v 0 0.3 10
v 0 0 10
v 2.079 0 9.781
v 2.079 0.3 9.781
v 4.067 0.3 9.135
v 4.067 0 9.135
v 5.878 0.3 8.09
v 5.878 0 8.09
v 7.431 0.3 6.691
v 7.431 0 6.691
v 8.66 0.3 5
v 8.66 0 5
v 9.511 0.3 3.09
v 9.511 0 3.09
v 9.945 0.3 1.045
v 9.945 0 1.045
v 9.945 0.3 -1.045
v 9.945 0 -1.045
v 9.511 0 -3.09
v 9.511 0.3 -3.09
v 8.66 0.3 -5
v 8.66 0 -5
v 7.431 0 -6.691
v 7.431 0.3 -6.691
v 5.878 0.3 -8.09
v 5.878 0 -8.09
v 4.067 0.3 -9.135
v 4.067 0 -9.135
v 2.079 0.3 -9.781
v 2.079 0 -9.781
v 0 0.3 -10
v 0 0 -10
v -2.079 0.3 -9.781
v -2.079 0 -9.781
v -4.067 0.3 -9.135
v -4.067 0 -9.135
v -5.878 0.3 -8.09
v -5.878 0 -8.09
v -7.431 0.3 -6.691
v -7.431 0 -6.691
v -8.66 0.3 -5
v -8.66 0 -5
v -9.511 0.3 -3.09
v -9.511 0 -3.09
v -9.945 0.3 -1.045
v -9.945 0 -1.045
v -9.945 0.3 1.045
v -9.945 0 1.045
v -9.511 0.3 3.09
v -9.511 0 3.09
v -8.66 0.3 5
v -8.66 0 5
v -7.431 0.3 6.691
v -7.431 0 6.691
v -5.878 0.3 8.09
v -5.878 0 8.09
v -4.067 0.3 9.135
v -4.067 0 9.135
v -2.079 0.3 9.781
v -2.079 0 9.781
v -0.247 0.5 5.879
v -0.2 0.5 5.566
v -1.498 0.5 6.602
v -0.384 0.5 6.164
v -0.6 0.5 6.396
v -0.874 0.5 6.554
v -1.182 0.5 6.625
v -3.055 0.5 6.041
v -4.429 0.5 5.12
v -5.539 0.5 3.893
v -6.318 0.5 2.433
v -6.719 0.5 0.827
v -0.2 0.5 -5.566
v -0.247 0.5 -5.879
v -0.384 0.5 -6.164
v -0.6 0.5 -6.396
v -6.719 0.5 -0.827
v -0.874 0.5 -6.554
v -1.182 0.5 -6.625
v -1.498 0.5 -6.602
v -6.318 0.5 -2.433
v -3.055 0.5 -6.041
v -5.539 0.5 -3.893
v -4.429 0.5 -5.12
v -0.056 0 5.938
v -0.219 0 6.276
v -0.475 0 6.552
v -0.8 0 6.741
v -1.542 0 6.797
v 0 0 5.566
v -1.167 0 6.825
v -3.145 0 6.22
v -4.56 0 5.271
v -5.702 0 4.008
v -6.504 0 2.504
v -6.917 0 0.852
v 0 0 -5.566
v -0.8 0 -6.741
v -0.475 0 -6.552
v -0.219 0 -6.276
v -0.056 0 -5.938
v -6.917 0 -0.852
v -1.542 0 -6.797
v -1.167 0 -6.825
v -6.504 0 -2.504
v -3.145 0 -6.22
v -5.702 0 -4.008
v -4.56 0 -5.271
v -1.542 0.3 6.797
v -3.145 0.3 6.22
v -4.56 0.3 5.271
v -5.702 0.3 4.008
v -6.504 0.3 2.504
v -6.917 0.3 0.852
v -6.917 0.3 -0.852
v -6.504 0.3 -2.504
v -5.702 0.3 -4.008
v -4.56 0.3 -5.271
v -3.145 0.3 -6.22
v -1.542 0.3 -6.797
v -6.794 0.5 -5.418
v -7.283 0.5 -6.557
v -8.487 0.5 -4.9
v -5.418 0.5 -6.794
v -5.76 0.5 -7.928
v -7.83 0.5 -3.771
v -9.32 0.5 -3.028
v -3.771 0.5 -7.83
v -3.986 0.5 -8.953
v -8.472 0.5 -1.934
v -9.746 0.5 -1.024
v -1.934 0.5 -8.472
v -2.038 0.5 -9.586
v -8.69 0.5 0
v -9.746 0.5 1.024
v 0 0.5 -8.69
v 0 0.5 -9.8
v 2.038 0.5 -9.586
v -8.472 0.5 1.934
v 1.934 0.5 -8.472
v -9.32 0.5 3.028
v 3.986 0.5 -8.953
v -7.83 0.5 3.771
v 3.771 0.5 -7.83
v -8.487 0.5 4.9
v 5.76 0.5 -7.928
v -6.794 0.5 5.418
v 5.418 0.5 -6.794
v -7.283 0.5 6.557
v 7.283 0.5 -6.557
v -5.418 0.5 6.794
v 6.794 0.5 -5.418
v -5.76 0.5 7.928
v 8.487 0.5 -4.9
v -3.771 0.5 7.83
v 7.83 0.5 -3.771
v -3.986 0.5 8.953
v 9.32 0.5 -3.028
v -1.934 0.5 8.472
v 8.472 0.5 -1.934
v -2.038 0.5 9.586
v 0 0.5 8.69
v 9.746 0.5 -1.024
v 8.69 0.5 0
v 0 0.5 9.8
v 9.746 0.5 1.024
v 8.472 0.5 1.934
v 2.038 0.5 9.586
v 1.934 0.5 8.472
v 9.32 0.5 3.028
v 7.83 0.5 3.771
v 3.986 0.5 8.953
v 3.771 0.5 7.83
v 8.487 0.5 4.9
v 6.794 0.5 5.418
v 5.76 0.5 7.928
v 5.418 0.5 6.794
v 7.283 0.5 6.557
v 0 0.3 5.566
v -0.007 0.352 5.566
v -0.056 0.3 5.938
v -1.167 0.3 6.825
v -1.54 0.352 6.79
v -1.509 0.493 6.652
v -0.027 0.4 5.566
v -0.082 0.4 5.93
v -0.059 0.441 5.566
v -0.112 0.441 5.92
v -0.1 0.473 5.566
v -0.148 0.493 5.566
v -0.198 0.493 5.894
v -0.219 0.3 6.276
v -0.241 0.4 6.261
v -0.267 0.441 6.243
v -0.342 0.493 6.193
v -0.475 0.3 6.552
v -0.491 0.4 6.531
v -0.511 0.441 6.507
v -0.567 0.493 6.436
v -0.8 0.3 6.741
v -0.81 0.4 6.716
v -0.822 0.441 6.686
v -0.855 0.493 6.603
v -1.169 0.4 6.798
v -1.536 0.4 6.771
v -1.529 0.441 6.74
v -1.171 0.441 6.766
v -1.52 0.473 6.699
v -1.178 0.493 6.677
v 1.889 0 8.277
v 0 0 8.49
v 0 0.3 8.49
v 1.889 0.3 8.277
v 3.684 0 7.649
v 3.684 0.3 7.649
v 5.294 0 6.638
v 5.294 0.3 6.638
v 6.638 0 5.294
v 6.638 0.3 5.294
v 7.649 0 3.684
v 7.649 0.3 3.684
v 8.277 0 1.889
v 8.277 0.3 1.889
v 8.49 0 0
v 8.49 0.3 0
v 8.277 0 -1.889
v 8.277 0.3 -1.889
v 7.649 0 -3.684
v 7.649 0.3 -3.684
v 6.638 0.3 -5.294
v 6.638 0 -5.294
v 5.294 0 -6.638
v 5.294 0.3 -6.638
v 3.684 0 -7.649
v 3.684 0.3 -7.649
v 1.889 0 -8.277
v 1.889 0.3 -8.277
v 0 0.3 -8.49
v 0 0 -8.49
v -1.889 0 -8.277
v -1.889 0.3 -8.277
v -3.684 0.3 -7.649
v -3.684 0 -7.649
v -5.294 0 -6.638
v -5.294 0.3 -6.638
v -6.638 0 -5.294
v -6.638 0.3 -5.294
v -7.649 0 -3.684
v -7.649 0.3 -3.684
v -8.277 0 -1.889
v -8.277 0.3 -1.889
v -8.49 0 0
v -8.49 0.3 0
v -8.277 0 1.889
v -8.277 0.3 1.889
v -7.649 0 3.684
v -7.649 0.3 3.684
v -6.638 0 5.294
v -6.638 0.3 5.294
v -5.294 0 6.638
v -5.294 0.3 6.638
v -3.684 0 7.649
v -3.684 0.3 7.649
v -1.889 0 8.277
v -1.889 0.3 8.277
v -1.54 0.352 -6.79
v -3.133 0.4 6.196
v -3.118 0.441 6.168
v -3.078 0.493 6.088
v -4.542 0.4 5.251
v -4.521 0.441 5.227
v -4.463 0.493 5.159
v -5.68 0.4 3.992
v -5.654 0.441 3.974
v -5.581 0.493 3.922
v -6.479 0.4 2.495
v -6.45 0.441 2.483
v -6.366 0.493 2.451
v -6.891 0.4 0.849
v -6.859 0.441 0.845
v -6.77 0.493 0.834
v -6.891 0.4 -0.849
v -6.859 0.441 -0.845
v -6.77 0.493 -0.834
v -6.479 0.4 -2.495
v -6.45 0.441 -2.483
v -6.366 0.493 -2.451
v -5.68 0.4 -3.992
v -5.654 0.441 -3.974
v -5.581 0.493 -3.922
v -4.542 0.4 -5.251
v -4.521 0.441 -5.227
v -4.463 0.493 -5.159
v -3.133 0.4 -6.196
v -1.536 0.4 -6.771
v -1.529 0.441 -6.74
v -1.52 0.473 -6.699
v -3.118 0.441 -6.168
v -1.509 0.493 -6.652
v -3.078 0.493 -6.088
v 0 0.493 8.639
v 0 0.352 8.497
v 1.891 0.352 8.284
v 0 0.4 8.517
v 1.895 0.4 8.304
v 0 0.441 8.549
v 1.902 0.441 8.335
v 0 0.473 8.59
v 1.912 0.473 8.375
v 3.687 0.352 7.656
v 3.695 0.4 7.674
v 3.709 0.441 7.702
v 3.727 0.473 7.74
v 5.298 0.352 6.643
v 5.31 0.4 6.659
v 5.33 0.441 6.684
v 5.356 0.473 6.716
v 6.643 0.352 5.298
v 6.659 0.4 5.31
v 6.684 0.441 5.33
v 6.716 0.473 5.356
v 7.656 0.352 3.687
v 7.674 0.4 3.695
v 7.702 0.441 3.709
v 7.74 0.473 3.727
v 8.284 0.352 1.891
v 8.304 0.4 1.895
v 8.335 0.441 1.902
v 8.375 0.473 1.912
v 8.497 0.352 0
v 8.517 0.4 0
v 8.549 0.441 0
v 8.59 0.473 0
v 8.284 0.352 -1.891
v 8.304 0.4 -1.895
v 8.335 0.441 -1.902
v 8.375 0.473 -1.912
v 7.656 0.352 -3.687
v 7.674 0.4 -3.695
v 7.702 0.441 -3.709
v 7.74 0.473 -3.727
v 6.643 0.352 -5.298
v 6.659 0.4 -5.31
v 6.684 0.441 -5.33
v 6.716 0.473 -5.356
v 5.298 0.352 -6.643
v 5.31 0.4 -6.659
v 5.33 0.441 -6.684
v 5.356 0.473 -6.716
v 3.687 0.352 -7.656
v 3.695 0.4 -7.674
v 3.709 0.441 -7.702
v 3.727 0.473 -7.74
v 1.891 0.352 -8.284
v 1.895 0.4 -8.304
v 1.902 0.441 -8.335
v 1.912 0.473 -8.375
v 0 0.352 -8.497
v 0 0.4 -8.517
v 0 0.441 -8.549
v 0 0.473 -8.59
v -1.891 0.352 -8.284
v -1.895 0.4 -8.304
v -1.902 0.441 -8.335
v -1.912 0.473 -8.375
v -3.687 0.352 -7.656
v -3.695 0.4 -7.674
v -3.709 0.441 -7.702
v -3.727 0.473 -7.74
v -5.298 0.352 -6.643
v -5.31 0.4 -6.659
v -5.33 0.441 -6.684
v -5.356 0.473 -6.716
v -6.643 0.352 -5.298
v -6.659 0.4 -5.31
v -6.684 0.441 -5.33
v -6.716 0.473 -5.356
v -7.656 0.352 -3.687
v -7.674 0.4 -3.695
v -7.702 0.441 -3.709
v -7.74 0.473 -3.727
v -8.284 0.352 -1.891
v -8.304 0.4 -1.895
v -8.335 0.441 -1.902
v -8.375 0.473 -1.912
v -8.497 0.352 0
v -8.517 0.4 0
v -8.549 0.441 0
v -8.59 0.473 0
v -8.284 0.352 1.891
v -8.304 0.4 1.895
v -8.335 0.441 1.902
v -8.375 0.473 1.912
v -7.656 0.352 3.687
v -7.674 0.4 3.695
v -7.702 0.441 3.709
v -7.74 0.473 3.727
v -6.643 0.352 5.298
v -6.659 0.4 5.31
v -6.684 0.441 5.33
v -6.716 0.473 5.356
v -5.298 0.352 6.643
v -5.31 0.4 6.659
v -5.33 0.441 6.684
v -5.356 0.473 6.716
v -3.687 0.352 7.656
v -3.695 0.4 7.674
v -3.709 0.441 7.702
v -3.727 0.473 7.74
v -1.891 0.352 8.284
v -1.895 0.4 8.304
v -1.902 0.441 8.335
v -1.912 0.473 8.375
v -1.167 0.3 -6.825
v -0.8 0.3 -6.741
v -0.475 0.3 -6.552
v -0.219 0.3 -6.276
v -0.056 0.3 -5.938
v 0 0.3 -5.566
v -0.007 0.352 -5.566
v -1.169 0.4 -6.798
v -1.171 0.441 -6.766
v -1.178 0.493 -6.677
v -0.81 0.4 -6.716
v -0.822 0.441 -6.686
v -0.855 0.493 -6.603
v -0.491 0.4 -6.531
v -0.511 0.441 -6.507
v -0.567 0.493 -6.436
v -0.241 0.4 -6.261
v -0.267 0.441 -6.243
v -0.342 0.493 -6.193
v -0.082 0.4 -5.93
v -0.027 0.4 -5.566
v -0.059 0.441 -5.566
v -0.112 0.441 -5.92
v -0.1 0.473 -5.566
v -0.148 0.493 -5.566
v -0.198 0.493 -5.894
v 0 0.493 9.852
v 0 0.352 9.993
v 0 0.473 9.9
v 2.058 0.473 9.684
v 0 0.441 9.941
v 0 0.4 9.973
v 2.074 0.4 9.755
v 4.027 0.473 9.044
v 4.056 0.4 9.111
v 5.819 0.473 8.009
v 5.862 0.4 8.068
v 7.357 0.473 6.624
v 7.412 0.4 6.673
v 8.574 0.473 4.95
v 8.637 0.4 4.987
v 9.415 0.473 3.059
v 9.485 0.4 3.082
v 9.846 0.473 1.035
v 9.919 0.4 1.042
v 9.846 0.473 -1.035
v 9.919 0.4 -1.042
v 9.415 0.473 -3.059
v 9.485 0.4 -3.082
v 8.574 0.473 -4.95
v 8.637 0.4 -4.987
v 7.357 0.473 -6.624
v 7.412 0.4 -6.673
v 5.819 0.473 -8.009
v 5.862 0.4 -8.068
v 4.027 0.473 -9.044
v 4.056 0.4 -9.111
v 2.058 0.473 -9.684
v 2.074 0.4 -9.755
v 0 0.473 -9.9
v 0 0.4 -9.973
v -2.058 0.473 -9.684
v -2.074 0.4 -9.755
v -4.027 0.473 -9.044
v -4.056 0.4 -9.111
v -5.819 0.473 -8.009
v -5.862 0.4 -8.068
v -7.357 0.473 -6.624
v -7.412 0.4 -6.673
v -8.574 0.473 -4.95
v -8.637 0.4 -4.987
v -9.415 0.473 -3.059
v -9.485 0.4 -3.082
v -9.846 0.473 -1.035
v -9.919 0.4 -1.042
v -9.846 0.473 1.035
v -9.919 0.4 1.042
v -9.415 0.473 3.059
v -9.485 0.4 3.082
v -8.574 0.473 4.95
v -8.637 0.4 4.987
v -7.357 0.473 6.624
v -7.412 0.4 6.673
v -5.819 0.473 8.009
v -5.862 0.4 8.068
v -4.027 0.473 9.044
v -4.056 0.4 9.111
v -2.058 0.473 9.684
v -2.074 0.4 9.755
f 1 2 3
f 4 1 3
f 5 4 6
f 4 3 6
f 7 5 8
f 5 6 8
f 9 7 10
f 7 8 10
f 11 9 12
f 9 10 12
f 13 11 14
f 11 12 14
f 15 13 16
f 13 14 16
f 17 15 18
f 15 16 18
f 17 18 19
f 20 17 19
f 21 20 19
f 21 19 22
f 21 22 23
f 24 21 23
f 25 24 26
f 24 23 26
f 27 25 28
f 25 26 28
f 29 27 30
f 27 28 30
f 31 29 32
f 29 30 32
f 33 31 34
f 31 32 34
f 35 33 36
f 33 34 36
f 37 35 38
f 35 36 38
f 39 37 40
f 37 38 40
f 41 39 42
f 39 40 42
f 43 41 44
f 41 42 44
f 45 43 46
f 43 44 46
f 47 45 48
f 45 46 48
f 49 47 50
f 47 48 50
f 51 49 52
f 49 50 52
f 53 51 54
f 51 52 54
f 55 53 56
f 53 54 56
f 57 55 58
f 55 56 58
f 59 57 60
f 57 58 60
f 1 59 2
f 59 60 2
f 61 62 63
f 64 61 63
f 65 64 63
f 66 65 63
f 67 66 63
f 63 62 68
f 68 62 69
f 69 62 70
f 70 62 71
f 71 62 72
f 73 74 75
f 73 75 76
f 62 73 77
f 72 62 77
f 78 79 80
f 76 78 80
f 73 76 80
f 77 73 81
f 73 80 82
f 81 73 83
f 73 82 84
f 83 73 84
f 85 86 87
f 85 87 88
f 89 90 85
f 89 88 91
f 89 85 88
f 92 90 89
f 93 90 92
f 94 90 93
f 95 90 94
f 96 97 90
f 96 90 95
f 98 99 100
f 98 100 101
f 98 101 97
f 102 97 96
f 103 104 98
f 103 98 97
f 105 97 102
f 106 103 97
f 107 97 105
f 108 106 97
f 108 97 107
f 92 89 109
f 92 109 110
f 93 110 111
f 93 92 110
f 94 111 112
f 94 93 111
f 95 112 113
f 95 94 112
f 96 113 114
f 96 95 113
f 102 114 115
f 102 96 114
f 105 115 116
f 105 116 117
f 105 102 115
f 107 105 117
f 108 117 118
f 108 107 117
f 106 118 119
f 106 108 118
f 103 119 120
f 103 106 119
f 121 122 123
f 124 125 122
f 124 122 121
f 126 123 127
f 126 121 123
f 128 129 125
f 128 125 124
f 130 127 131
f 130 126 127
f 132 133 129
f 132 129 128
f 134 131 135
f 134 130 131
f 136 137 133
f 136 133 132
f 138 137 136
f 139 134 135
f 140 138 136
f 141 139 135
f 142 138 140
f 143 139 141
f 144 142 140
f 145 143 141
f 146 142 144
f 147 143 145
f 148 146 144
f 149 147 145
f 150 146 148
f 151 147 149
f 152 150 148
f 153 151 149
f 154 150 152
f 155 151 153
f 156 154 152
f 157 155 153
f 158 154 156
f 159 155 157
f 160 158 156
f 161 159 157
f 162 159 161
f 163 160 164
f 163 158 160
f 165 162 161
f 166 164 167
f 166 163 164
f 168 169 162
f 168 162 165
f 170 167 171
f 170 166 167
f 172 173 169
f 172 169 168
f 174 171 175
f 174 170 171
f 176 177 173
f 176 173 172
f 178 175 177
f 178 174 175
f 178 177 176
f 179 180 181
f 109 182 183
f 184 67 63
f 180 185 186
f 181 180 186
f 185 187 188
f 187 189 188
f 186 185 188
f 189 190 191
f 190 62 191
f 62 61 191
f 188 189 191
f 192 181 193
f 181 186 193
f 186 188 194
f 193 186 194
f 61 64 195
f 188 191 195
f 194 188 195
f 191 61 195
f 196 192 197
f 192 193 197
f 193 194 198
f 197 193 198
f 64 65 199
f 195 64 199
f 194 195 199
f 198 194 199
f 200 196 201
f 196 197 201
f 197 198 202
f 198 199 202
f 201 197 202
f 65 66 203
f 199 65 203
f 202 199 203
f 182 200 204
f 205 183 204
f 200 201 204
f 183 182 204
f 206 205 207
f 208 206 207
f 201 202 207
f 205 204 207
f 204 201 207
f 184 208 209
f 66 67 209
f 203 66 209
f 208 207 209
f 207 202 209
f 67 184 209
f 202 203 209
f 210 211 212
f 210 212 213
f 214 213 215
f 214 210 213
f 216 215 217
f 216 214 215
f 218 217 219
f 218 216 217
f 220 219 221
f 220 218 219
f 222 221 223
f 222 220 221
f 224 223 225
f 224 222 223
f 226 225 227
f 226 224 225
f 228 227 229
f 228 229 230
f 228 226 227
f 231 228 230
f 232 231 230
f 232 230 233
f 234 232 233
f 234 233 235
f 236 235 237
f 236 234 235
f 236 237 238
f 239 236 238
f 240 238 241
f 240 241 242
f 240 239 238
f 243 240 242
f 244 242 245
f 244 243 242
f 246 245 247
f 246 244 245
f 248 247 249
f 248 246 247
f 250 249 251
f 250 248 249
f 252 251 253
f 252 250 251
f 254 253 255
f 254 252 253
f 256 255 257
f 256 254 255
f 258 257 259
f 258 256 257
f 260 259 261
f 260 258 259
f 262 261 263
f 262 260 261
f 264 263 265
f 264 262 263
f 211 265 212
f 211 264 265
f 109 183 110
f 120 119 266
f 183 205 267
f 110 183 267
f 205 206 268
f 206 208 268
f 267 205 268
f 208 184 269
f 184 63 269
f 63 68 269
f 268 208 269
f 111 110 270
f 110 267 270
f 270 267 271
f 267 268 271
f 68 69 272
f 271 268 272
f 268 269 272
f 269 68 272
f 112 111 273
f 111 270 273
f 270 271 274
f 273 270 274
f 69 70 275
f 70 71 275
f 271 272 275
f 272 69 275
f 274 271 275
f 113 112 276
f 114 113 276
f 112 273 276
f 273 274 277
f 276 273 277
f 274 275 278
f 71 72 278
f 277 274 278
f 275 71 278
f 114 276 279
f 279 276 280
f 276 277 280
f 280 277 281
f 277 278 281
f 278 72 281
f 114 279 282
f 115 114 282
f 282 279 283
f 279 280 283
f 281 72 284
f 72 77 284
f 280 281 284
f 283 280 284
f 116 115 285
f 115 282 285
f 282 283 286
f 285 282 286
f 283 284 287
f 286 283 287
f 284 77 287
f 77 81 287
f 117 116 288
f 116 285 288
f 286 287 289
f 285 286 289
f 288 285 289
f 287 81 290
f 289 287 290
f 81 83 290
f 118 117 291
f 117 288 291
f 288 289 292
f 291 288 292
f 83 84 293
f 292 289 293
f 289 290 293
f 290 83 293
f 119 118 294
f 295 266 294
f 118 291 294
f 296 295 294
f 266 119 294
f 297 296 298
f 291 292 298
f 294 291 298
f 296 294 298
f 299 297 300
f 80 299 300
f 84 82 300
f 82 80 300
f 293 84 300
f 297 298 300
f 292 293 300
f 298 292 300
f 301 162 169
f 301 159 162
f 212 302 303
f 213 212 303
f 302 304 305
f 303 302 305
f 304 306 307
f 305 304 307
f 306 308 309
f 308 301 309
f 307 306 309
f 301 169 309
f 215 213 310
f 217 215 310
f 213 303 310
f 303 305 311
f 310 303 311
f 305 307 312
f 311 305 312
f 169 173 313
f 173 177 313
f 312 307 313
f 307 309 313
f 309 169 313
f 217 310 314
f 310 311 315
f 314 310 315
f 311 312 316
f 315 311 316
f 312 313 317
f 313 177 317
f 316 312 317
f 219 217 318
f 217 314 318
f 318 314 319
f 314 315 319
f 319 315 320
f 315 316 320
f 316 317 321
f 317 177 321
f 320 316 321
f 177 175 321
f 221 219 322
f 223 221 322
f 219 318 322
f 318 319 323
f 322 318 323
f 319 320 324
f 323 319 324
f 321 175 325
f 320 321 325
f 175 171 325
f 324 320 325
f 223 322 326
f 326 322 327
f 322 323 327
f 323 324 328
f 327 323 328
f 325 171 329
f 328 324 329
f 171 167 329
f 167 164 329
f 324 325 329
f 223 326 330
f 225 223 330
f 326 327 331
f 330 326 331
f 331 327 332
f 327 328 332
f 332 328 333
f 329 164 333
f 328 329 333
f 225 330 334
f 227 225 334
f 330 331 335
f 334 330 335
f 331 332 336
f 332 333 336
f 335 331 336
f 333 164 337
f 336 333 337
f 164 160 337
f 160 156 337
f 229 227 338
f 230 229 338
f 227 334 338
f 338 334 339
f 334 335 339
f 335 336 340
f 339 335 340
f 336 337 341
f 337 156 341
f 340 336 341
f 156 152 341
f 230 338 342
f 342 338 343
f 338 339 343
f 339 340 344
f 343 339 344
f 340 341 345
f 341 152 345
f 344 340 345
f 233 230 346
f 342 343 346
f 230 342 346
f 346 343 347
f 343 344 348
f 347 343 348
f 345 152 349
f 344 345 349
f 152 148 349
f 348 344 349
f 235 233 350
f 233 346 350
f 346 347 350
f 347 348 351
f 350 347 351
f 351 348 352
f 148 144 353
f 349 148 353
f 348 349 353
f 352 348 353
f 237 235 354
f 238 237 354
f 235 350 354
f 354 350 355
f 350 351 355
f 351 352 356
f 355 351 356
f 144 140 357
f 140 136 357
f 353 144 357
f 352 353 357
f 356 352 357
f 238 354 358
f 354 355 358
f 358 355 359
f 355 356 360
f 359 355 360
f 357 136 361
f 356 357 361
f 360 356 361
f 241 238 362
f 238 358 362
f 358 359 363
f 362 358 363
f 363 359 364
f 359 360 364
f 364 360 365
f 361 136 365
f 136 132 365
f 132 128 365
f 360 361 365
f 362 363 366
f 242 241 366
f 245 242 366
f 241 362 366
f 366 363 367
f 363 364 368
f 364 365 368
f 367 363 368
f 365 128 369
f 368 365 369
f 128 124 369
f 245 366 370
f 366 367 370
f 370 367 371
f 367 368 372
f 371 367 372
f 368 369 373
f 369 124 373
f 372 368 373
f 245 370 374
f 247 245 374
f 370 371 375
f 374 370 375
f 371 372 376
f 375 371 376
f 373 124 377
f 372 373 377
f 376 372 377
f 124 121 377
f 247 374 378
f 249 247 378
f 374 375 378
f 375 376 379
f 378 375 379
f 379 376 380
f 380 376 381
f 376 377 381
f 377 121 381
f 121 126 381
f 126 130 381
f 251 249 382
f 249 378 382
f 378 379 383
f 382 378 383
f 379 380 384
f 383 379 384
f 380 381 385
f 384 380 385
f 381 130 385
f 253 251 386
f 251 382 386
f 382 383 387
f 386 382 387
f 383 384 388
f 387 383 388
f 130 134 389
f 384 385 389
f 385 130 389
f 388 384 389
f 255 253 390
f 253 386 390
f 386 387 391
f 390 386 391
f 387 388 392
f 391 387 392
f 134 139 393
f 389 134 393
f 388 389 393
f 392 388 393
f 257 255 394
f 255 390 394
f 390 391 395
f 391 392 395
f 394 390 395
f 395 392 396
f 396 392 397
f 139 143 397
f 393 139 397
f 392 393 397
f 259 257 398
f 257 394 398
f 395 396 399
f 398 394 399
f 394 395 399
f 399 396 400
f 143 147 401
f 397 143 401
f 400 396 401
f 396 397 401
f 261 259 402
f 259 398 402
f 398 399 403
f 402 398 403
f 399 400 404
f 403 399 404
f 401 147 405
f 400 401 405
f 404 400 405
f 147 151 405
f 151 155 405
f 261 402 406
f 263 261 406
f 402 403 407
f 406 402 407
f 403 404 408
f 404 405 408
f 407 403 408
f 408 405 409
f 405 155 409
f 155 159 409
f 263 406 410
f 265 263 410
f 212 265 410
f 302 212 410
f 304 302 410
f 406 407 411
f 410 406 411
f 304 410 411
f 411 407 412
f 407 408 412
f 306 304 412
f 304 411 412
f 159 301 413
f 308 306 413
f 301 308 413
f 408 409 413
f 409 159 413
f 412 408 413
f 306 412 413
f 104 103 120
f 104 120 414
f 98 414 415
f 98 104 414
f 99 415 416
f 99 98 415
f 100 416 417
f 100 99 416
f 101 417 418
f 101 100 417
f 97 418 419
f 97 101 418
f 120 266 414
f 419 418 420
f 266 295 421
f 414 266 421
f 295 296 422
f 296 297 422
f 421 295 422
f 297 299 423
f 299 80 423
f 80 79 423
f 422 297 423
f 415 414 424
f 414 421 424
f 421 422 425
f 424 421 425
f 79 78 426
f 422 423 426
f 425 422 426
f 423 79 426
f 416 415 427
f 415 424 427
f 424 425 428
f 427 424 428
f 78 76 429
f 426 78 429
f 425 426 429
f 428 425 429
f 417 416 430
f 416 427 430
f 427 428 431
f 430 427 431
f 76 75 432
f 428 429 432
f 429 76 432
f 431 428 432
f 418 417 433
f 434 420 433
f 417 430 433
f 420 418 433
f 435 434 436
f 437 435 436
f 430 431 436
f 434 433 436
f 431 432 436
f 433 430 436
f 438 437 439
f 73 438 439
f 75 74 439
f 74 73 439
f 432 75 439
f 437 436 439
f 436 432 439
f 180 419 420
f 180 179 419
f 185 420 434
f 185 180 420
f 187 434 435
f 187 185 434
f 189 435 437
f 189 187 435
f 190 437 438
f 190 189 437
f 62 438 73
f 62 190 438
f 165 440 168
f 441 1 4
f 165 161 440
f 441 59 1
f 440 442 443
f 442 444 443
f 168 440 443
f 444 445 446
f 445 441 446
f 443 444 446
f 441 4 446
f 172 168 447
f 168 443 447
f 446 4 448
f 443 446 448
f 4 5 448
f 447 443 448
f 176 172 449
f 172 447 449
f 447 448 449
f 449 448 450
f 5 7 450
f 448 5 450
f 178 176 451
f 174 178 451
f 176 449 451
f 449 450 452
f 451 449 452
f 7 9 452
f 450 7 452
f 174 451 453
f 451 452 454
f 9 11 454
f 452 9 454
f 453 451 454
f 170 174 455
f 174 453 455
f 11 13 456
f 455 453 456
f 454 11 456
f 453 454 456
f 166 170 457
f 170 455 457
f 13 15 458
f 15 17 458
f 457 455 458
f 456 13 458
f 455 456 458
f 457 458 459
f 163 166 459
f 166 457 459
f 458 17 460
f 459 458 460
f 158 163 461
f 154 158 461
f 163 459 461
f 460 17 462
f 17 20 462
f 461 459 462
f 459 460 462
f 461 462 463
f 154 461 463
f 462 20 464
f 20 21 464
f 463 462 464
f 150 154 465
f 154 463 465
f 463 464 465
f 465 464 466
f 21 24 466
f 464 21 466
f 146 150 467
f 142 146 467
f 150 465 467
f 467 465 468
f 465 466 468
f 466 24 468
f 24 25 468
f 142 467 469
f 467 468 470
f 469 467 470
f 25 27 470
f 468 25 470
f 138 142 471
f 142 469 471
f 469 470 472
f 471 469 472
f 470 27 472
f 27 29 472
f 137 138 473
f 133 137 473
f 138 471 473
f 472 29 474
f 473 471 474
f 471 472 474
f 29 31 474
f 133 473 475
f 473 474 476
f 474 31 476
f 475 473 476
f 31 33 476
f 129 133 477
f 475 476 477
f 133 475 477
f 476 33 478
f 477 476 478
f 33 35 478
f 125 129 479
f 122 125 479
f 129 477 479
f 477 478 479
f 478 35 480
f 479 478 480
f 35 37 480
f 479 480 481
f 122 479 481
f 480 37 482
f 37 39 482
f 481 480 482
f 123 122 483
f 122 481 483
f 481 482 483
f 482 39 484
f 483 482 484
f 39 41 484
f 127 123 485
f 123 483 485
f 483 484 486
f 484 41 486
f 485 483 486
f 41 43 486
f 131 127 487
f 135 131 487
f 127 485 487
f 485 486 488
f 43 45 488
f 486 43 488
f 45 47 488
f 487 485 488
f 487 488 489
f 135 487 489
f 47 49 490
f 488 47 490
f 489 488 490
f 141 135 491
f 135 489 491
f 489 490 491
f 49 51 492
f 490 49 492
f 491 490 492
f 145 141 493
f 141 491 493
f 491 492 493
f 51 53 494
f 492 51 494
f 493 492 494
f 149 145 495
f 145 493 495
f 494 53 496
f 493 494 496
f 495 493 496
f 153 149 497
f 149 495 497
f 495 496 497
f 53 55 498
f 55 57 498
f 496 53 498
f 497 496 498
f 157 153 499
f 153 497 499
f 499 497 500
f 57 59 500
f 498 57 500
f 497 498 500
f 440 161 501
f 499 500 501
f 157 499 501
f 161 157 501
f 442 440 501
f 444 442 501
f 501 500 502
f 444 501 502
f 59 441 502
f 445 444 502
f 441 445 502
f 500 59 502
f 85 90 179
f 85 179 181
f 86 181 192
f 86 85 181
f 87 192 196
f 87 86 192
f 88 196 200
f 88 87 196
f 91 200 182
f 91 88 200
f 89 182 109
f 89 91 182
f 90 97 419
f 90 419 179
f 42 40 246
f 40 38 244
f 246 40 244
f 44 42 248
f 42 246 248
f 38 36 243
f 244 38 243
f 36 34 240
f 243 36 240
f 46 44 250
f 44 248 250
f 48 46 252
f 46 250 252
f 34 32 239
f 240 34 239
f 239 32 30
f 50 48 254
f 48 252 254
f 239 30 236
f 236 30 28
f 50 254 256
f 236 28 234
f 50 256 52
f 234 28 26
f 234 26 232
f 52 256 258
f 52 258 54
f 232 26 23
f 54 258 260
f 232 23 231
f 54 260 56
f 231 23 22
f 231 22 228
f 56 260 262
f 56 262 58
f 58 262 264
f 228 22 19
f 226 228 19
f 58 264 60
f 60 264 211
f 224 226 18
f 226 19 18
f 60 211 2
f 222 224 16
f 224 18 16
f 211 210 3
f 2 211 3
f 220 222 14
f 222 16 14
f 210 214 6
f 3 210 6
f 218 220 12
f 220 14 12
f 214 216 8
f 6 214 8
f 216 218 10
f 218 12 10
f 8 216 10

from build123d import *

# Parameters (mm, degrees)
EXTRUDE_1_DEPTH   = 0.5
SKETCH_1_R        = 10
SKETCH_1_R_2      = 8.490267481
EXTRUDE_1_2_DEPTH = 0.5
FILLET_1_R        = 0.2
FILLET_2_R        = 0.2
FILLET_3_R        = 0.2


with BuildPart() as part:
    # Эскиз1 → Бобышка-Вытянуть1 (new body)
    with BuildSketch(Plane(origin=(0, 0, 0), x_dir=(1, 0, 0), z_dir=(0, 1, 0))):
        with BuildLine():
            ThreePointArc((0, -5.565646409), (-0.474742908, -6.552289655), (-1.5419684, -6.796984316))
            ThreePointArc((-1.5419684, -6.796984316), (-6.969696, 0), (-1.5419684, 6.796984316))
            ThreePointArc((-1.5419684, 6.796984316), (-0.474742908, 6.552289655), (0, 5.565646409))
            Line((0, 5.565646409), (0, -5.565646409))
        make_face()
    extrude(amount=EXTRUDE_1_DEPTH)

    # Скругление1
    fillet_1_edges = [part.edges().sort_by_distance(p)[0] for p in [
        (-0.474742908, 0.5, -6.552289655),
        (-6.969696, 0.5, 0),
        (-0.474742908, 0.5, 6.552289655),
        (0, 0.5, 0),
    ]]
    fillet(fillet_1_edges, radius=FILLET_1_R)


with BuildPart() as body_2:
    # Эскиз1 → Extrude 1 2 (new body)
    with BuildSketch(Plane(origin=(0, 0, 0), x_dir=(1, 0, 0), z_dir=(0, 1, 0))):
        with Locations(Location((0, 0, 0), (0, 0, 270))):
            Circle(SKETCH_1_R)
        with Locations(Location((0, 0, 0), (0, 0, 270))):
            Circle(SKETCH_1_R_2, mode=Mode.SUBTRACT)
    extrude(amount=EXTRUDE_1_2_DEPTH)

    # Скругление2
    fillet_2_edges = [body_2.edges().sort_by_distance(p)[0] for p in [
        (0, 0.5, -8.490267481),
    ]]
    fillet(fillet_2_edges, radius=FILLET_2_R)

    # Скругление3
    fillet_3_edges = [body_2.edges().sort_by_distance(p)[0] for p in [
        (0, 0.5, -10),
    ]]
    fillet(fillet_3_edges, radius=FILLET_3_R)


solid = Compound([part.part, body_2.part])
